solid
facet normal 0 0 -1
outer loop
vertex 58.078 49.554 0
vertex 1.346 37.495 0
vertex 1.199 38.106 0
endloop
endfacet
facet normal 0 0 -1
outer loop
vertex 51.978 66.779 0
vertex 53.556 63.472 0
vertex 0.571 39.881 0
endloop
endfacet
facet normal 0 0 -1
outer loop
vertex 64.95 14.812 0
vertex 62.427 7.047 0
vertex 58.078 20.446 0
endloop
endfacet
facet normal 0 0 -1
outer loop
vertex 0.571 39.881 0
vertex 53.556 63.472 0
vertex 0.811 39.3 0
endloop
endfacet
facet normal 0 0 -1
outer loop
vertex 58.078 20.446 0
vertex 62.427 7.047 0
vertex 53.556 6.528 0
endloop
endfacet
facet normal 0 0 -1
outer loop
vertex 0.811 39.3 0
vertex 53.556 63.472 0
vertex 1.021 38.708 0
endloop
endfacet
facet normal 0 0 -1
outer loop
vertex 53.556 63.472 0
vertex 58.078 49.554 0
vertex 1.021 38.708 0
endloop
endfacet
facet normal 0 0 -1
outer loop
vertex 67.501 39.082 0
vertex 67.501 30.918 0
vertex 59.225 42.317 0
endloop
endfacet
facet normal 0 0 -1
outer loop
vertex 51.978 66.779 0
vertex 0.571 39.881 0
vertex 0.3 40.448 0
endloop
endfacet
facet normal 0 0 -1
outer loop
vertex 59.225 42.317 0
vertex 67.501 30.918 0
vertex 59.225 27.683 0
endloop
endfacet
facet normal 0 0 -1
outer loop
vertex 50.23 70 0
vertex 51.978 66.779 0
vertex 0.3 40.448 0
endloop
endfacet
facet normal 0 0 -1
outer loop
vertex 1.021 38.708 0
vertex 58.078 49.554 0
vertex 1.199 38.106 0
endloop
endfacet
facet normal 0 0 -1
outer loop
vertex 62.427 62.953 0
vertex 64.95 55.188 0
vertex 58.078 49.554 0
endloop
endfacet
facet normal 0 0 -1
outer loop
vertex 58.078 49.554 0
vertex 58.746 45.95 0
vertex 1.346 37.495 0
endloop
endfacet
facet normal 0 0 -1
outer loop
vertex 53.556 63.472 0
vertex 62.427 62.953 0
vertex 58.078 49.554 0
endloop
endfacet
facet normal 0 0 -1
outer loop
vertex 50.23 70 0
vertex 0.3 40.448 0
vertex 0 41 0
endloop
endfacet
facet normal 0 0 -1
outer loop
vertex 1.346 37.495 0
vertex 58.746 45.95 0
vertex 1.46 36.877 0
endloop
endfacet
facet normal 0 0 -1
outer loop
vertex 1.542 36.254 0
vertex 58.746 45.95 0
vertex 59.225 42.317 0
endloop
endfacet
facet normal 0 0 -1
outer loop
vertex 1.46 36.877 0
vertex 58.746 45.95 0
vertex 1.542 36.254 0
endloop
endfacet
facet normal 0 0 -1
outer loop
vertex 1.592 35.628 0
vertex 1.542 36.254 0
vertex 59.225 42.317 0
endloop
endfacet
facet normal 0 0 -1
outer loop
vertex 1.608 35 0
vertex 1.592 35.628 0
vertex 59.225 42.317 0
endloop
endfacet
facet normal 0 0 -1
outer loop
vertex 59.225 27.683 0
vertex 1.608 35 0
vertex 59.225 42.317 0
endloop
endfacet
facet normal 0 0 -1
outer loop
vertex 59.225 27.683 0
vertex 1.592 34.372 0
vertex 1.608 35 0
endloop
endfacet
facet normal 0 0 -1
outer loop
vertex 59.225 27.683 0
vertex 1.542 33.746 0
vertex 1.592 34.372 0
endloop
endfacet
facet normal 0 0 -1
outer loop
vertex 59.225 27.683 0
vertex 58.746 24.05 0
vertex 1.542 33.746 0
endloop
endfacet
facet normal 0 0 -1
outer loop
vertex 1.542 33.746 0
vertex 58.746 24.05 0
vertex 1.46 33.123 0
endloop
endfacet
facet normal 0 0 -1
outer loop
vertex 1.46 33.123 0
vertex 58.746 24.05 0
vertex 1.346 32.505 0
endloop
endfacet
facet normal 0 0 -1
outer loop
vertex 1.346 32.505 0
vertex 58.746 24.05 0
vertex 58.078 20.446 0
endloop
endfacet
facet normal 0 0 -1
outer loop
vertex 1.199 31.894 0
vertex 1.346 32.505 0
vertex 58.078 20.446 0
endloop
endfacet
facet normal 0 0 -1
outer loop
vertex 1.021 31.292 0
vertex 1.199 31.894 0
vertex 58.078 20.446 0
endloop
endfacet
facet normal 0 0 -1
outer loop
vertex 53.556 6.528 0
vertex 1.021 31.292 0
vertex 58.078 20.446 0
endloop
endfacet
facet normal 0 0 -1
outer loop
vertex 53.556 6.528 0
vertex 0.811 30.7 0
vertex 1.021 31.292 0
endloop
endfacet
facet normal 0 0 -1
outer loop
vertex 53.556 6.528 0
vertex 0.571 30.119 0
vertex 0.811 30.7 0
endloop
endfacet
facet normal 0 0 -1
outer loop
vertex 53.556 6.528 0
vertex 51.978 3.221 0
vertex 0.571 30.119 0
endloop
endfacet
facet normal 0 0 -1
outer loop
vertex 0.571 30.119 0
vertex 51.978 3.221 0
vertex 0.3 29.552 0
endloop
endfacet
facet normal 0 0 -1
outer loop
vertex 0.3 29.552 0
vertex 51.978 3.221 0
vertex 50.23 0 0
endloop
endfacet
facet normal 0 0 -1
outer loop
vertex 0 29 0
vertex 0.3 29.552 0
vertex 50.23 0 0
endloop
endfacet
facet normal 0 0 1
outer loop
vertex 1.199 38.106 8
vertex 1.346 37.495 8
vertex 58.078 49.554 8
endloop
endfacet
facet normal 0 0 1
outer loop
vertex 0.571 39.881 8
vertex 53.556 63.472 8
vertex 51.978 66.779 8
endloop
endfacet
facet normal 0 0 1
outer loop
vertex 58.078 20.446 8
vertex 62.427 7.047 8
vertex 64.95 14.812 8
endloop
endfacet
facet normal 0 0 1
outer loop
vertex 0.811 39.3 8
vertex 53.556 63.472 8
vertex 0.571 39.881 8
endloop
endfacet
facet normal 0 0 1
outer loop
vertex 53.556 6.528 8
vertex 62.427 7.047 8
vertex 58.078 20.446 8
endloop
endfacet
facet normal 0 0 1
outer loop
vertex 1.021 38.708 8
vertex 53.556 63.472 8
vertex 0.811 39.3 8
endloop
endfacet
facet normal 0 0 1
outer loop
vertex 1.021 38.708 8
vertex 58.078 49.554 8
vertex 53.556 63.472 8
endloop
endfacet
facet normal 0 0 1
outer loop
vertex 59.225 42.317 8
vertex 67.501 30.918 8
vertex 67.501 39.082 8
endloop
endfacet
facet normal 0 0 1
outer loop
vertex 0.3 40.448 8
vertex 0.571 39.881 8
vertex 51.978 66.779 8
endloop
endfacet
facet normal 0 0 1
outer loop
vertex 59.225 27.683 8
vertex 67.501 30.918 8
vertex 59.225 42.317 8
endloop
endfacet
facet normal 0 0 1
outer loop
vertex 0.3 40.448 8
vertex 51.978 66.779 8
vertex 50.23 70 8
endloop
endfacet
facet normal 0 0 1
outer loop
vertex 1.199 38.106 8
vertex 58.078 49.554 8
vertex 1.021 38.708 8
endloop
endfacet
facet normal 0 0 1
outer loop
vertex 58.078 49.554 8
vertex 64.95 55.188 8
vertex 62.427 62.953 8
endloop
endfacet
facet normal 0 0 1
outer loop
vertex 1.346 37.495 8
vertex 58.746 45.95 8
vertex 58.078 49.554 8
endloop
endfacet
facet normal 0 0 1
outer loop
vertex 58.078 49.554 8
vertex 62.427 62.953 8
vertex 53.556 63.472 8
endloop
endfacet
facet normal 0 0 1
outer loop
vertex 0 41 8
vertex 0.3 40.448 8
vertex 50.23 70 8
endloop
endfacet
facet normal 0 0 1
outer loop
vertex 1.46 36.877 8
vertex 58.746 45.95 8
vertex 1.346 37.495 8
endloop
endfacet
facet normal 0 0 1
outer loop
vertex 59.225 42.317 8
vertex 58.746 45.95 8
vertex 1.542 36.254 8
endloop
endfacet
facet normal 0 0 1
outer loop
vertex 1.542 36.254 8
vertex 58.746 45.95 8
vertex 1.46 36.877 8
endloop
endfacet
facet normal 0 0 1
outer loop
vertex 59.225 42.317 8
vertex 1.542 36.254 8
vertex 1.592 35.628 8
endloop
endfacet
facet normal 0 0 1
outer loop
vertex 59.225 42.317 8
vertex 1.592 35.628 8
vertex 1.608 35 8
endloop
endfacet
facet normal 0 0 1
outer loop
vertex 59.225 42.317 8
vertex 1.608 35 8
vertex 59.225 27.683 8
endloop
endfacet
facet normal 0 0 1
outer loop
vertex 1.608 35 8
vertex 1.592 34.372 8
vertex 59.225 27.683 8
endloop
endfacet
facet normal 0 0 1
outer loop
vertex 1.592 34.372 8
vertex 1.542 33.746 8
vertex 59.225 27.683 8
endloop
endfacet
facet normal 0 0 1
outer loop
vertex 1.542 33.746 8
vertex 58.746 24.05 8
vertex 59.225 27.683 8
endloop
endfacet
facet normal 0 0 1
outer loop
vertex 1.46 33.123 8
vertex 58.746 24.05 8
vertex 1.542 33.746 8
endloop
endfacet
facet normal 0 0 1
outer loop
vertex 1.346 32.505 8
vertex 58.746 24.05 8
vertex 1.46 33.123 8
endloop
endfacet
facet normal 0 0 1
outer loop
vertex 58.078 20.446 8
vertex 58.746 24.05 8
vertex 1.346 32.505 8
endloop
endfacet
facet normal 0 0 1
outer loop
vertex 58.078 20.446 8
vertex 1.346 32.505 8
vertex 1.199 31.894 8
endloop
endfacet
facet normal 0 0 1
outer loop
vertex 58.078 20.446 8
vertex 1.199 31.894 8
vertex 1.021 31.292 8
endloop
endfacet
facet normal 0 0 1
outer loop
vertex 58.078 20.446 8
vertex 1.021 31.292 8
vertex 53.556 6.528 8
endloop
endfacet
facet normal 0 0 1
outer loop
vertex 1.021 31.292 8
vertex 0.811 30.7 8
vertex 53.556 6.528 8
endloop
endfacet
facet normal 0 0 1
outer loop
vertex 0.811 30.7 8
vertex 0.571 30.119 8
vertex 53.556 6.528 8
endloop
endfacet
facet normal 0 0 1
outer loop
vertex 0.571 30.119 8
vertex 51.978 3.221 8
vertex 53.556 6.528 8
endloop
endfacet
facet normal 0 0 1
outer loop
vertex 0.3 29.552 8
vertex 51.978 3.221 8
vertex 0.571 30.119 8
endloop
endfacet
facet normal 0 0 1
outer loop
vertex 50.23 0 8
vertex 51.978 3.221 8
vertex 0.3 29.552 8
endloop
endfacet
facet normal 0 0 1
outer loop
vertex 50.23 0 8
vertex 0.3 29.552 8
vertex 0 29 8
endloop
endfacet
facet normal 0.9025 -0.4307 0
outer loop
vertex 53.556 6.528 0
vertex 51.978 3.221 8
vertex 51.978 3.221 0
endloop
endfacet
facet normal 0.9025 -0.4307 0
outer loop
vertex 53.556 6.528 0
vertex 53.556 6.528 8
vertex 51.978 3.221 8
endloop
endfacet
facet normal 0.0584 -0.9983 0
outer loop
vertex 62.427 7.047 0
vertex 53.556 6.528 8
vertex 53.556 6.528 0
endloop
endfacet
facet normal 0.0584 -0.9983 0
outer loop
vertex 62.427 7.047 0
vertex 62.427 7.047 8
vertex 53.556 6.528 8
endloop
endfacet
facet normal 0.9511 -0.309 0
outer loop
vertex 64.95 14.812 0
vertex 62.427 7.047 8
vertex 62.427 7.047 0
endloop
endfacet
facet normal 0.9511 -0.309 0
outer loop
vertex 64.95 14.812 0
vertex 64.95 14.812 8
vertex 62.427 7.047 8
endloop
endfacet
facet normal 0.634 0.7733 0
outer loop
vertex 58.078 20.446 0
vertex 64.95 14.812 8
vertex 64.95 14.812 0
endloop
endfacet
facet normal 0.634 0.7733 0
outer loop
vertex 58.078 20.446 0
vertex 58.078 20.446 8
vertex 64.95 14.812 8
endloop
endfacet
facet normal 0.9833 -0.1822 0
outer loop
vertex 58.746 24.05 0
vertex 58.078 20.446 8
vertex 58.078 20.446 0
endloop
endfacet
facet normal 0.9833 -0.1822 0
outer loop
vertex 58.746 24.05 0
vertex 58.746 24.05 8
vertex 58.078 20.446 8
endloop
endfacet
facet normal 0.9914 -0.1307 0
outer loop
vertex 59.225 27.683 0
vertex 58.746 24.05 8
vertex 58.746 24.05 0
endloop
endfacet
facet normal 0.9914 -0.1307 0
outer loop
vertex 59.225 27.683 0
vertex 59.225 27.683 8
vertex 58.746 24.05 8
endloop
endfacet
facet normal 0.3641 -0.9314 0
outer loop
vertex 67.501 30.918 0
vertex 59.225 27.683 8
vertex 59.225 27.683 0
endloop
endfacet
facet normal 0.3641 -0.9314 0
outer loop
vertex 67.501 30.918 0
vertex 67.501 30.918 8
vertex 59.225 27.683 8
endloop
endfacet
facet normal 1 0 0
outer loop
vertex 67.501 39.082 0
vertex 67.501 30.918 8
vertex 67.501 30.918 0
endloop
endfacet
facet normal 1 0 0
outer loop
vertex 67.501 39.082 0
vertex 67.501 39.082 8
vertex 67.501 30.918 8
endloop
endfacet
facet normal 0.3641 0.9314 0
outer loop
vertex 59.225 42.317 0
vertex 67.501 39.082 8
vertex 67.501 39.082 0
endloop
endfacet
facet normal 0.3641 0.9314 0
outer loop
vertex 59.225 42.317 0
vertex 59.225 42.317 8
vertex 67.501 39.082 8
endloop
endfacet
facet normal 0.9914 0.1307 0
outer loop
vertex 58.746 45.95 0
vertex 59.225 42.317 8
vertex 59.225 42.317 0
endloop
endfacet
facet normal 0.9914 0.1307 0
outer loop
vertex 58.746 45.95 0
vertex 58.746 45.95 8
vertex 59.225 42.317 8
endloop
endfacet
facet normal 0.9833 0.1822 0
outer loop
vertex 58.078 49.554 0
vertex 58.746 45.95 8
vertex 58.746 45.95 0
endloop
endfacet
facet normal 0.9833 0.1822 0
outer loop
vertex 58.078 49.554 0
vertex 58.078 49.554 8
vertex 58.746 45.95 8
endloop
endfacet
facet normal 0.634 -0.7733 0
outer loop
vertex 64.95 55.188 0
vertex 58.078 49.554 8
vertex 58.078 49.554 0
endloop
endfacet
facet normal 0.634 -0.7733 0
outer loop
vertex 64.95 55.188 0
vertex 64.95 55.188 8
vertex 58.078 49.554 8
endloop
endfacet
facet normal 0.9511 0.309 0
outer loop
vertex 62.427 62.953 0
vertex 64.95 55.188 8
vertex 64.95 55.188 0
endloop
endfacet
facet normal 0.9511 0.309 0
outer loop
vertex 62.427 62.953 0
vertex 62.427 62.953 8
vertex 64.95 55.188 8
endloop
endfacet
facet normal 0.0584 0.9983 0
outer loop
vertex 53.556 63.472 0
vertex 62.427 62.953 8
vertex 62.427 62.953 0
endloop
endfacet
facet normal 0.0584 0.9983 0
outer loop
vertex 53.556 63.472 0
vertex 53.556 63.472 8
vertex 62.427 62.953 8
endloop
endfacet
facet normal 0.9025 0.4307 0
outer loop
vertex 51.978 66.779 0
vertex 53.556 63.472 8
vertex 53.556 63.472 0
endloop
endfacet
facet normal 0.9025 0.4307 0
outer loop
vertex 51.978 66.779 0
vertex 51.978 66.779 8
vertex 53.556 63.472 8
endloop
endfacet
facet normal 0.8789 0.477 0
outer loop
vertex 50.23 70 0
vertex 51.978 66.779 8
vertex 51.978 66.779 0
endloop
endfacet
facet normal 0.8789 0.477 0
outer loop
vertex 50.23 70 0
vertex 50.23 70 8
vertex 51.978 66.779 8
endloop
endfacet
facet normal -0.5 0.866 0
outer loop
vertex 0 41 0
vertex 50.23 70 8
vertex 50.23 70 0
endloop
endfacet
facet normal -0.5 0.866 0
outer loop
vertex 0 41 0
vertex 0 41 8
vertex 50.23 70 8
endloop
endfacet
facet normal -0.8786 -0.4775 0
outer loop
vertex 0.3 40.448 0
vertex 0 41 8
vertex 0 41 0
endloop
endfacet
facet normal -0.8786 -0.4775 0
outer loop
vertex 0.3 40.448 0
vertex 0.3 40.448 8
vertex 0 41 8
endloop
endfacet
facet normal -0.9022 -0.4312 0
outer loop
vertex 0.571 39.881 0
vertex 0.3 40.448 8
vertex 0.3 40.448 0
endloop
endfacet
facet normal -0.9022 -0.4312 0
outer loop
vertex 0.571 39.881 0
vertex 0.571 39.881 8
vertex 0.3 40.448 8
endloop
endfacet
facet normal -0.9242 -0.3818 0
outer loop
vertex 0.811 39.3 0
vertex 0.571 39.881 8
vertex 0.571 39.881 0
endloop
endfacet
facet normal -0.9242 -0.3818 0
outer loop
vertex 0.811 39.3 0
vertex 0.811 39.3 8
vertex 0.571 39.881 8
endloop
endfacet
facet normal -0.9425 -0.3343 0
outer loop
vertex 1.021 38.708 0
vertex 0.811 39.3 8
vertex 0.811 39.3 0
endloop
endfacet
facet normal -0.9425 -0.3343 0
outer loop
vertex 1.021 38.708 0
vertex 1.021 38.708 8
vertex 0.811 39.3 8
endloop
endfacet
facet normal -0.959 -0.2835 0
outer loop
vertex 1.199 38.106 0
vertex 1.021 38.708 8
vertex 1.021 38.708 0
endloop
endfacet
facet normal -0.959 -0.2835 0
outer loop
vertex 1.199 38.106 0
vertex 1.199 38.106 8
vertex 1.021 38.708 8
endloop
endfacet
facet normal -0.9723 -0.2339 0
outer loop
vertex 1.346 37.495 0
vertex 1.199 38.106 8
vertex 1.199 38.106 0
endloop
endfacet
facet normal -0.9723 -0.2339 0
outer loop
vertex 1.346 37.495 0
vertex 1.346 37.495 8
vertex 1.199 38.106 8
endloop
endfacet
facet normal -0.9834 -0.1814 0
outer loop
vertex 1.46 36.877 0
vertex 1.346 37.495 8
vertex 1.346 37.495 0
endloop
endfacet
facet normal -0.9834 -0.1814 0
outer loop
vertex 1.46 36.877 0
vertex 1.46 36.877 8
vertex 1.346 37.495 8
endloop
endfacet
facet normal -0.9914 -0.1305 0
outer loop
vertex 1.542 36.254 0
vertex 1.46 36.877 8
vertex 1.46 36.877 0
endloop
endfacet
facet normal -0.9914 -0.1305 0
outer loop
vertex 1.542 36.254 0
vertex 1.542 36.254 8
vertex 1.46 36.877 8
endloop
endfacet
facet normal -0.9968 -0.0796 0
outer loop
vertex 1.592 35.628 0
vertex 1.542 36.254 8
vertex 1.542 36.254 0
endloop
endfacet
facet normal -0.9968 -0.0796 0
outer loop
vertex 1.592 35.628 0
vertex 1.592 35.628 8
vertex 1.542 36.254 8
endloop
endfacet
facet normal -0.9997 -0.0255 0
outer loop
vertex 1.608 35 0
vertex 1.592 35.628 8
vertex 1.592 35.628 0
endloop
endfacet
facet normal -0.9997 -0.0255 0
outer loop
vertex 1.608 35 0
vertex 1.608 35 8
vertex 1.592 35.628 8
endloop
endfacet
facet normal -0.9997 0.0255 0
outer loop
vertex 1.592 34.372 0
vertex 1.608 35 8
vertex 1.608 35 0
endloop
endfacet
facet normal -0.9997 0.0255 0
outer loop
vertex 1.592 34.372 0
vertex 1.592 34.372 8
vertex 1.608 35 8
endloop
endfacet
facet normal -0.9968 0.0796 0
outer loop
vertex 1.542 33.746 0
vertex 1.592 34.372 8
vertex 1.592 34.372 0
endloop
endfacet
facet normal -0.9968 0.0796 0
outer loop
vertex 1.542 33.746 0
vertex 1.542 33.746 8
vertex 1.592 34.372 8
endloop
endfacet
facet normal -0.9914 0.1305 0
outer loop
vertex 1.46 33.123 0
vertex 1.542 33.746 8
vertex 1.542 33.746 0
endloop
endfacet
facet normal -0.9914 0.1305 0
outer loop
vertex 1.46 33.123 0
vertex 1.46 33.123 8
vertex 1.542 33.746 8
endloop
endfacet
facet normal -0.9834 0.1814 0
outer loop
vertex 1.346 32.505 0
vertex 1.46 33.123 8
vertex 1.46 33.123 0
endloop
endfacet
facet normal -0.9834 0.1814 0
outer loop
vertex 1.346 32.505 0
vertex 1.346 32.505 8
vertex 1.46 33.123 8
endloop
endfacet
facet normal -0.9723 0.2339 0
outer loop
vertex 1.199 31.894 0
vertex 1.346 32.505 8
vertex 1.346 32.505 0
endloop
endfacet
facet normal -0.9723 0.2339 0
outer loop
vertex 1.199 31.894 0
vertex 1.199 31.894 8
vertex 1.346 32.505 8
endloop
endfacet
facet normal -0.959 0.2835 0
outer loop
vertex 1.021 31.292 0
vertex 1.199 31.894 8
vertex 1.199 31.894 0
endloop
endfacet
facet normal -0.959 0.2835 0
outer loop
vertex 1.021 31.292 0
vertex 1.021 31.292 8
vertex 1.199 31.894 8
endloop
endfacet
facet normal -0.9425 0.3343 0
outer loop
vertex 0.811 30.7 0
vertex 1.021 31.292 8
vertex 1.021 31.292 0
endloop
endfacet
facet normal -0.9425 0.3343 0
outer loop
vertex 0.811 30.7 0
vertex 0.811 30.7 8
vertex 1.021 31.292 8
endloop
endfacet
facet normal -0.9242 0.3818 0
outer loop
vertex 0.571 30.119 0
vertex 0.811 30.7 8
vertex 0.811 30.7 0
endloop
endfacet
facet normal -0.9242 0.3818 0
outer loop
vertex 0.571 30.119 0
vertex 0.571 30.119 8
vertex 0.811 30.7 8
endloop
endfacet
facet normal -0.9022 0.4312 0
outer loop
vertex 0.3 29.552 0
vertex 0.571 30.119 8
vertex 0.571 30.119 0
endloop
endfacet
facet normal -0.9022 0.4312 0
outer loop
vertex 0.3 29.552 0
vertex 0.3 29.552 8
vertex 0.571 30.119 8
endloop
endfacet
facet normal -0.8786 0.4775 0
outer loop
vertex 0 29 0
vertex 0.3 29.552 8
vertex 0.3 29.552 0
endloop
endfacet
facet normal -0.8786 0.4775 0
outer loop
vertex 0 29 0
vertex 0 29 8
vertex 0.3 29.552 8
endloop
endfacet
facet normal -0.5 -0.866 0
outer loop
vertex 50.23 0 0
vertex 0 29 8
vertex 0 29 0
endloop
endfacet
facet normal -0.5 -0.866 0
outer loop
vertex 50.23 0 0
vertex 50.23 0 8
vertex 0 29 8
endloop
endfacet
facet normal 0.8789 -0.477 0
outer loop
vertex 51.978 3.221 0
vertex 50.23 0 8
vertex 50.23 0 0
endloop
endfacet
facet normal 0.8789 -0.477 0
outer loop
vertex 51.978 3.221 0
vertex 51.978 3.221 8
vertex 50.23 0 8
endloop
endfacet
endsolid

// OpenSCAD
$fn = 32;

// ----------------------------------------------------------------------
// Gear sector: 3 teeth on 60 degrees
// ----------------------------------------------------------------------

// --- parameters (mm) ---
sector_angle = 60;        // sector angle, degrees
root_r = 70;              // root circle radius
tooth_h = 8;              // tooth height over the root circle
teeth = 3;                // number of teeth on the sector
hub_r = 12;               // hub bore radius
plate_t = 8;              // sector thickness, Z
arc_step = 3;             // sampling step of the root/hub arcs, degrees

tip_r = root_r + tooth_h;  // tip circle radius

profile = [[50.23, 0], [51.978, 3.221], [53.556, 6.528], [62.427, 7.047], [64.95, 14.812], [58.078, 20.446], [58.746, 24.05], [59.225, 27.683], [67.501, 30.918], [67.501, 39.082], [59.225, 42.317], [58.746, 45.95], [58.078, 49.554], [64.95, 55.188], [62.427, 62.953], [53.556, 63.472], [51.978, 66.779], [50.23, 70], [0, 41], [0.3, 40.448], [0.571, 39.881], [0.811, 39.3], [1.021, 38.708], [1.199, 38.106], [1.346, 37.495], [1.46, 36.877], [1.542, 36.254], [1.592, 35.628], [1.608, 35], [1.592, 34.372], [1.542, 33.746], [1.46, 33.123], [1.346, 32.505], [1.199, 31.894], [1.021, 31.292], [0.811, 30.7], [0.571, 30.119], [0.3, 29.552], [0, 29]];  // primary outline, 39 points, counter clockwise

// --- the one profile operation ---
linear_extrude(height = plate_t) polygon(points = profile);
